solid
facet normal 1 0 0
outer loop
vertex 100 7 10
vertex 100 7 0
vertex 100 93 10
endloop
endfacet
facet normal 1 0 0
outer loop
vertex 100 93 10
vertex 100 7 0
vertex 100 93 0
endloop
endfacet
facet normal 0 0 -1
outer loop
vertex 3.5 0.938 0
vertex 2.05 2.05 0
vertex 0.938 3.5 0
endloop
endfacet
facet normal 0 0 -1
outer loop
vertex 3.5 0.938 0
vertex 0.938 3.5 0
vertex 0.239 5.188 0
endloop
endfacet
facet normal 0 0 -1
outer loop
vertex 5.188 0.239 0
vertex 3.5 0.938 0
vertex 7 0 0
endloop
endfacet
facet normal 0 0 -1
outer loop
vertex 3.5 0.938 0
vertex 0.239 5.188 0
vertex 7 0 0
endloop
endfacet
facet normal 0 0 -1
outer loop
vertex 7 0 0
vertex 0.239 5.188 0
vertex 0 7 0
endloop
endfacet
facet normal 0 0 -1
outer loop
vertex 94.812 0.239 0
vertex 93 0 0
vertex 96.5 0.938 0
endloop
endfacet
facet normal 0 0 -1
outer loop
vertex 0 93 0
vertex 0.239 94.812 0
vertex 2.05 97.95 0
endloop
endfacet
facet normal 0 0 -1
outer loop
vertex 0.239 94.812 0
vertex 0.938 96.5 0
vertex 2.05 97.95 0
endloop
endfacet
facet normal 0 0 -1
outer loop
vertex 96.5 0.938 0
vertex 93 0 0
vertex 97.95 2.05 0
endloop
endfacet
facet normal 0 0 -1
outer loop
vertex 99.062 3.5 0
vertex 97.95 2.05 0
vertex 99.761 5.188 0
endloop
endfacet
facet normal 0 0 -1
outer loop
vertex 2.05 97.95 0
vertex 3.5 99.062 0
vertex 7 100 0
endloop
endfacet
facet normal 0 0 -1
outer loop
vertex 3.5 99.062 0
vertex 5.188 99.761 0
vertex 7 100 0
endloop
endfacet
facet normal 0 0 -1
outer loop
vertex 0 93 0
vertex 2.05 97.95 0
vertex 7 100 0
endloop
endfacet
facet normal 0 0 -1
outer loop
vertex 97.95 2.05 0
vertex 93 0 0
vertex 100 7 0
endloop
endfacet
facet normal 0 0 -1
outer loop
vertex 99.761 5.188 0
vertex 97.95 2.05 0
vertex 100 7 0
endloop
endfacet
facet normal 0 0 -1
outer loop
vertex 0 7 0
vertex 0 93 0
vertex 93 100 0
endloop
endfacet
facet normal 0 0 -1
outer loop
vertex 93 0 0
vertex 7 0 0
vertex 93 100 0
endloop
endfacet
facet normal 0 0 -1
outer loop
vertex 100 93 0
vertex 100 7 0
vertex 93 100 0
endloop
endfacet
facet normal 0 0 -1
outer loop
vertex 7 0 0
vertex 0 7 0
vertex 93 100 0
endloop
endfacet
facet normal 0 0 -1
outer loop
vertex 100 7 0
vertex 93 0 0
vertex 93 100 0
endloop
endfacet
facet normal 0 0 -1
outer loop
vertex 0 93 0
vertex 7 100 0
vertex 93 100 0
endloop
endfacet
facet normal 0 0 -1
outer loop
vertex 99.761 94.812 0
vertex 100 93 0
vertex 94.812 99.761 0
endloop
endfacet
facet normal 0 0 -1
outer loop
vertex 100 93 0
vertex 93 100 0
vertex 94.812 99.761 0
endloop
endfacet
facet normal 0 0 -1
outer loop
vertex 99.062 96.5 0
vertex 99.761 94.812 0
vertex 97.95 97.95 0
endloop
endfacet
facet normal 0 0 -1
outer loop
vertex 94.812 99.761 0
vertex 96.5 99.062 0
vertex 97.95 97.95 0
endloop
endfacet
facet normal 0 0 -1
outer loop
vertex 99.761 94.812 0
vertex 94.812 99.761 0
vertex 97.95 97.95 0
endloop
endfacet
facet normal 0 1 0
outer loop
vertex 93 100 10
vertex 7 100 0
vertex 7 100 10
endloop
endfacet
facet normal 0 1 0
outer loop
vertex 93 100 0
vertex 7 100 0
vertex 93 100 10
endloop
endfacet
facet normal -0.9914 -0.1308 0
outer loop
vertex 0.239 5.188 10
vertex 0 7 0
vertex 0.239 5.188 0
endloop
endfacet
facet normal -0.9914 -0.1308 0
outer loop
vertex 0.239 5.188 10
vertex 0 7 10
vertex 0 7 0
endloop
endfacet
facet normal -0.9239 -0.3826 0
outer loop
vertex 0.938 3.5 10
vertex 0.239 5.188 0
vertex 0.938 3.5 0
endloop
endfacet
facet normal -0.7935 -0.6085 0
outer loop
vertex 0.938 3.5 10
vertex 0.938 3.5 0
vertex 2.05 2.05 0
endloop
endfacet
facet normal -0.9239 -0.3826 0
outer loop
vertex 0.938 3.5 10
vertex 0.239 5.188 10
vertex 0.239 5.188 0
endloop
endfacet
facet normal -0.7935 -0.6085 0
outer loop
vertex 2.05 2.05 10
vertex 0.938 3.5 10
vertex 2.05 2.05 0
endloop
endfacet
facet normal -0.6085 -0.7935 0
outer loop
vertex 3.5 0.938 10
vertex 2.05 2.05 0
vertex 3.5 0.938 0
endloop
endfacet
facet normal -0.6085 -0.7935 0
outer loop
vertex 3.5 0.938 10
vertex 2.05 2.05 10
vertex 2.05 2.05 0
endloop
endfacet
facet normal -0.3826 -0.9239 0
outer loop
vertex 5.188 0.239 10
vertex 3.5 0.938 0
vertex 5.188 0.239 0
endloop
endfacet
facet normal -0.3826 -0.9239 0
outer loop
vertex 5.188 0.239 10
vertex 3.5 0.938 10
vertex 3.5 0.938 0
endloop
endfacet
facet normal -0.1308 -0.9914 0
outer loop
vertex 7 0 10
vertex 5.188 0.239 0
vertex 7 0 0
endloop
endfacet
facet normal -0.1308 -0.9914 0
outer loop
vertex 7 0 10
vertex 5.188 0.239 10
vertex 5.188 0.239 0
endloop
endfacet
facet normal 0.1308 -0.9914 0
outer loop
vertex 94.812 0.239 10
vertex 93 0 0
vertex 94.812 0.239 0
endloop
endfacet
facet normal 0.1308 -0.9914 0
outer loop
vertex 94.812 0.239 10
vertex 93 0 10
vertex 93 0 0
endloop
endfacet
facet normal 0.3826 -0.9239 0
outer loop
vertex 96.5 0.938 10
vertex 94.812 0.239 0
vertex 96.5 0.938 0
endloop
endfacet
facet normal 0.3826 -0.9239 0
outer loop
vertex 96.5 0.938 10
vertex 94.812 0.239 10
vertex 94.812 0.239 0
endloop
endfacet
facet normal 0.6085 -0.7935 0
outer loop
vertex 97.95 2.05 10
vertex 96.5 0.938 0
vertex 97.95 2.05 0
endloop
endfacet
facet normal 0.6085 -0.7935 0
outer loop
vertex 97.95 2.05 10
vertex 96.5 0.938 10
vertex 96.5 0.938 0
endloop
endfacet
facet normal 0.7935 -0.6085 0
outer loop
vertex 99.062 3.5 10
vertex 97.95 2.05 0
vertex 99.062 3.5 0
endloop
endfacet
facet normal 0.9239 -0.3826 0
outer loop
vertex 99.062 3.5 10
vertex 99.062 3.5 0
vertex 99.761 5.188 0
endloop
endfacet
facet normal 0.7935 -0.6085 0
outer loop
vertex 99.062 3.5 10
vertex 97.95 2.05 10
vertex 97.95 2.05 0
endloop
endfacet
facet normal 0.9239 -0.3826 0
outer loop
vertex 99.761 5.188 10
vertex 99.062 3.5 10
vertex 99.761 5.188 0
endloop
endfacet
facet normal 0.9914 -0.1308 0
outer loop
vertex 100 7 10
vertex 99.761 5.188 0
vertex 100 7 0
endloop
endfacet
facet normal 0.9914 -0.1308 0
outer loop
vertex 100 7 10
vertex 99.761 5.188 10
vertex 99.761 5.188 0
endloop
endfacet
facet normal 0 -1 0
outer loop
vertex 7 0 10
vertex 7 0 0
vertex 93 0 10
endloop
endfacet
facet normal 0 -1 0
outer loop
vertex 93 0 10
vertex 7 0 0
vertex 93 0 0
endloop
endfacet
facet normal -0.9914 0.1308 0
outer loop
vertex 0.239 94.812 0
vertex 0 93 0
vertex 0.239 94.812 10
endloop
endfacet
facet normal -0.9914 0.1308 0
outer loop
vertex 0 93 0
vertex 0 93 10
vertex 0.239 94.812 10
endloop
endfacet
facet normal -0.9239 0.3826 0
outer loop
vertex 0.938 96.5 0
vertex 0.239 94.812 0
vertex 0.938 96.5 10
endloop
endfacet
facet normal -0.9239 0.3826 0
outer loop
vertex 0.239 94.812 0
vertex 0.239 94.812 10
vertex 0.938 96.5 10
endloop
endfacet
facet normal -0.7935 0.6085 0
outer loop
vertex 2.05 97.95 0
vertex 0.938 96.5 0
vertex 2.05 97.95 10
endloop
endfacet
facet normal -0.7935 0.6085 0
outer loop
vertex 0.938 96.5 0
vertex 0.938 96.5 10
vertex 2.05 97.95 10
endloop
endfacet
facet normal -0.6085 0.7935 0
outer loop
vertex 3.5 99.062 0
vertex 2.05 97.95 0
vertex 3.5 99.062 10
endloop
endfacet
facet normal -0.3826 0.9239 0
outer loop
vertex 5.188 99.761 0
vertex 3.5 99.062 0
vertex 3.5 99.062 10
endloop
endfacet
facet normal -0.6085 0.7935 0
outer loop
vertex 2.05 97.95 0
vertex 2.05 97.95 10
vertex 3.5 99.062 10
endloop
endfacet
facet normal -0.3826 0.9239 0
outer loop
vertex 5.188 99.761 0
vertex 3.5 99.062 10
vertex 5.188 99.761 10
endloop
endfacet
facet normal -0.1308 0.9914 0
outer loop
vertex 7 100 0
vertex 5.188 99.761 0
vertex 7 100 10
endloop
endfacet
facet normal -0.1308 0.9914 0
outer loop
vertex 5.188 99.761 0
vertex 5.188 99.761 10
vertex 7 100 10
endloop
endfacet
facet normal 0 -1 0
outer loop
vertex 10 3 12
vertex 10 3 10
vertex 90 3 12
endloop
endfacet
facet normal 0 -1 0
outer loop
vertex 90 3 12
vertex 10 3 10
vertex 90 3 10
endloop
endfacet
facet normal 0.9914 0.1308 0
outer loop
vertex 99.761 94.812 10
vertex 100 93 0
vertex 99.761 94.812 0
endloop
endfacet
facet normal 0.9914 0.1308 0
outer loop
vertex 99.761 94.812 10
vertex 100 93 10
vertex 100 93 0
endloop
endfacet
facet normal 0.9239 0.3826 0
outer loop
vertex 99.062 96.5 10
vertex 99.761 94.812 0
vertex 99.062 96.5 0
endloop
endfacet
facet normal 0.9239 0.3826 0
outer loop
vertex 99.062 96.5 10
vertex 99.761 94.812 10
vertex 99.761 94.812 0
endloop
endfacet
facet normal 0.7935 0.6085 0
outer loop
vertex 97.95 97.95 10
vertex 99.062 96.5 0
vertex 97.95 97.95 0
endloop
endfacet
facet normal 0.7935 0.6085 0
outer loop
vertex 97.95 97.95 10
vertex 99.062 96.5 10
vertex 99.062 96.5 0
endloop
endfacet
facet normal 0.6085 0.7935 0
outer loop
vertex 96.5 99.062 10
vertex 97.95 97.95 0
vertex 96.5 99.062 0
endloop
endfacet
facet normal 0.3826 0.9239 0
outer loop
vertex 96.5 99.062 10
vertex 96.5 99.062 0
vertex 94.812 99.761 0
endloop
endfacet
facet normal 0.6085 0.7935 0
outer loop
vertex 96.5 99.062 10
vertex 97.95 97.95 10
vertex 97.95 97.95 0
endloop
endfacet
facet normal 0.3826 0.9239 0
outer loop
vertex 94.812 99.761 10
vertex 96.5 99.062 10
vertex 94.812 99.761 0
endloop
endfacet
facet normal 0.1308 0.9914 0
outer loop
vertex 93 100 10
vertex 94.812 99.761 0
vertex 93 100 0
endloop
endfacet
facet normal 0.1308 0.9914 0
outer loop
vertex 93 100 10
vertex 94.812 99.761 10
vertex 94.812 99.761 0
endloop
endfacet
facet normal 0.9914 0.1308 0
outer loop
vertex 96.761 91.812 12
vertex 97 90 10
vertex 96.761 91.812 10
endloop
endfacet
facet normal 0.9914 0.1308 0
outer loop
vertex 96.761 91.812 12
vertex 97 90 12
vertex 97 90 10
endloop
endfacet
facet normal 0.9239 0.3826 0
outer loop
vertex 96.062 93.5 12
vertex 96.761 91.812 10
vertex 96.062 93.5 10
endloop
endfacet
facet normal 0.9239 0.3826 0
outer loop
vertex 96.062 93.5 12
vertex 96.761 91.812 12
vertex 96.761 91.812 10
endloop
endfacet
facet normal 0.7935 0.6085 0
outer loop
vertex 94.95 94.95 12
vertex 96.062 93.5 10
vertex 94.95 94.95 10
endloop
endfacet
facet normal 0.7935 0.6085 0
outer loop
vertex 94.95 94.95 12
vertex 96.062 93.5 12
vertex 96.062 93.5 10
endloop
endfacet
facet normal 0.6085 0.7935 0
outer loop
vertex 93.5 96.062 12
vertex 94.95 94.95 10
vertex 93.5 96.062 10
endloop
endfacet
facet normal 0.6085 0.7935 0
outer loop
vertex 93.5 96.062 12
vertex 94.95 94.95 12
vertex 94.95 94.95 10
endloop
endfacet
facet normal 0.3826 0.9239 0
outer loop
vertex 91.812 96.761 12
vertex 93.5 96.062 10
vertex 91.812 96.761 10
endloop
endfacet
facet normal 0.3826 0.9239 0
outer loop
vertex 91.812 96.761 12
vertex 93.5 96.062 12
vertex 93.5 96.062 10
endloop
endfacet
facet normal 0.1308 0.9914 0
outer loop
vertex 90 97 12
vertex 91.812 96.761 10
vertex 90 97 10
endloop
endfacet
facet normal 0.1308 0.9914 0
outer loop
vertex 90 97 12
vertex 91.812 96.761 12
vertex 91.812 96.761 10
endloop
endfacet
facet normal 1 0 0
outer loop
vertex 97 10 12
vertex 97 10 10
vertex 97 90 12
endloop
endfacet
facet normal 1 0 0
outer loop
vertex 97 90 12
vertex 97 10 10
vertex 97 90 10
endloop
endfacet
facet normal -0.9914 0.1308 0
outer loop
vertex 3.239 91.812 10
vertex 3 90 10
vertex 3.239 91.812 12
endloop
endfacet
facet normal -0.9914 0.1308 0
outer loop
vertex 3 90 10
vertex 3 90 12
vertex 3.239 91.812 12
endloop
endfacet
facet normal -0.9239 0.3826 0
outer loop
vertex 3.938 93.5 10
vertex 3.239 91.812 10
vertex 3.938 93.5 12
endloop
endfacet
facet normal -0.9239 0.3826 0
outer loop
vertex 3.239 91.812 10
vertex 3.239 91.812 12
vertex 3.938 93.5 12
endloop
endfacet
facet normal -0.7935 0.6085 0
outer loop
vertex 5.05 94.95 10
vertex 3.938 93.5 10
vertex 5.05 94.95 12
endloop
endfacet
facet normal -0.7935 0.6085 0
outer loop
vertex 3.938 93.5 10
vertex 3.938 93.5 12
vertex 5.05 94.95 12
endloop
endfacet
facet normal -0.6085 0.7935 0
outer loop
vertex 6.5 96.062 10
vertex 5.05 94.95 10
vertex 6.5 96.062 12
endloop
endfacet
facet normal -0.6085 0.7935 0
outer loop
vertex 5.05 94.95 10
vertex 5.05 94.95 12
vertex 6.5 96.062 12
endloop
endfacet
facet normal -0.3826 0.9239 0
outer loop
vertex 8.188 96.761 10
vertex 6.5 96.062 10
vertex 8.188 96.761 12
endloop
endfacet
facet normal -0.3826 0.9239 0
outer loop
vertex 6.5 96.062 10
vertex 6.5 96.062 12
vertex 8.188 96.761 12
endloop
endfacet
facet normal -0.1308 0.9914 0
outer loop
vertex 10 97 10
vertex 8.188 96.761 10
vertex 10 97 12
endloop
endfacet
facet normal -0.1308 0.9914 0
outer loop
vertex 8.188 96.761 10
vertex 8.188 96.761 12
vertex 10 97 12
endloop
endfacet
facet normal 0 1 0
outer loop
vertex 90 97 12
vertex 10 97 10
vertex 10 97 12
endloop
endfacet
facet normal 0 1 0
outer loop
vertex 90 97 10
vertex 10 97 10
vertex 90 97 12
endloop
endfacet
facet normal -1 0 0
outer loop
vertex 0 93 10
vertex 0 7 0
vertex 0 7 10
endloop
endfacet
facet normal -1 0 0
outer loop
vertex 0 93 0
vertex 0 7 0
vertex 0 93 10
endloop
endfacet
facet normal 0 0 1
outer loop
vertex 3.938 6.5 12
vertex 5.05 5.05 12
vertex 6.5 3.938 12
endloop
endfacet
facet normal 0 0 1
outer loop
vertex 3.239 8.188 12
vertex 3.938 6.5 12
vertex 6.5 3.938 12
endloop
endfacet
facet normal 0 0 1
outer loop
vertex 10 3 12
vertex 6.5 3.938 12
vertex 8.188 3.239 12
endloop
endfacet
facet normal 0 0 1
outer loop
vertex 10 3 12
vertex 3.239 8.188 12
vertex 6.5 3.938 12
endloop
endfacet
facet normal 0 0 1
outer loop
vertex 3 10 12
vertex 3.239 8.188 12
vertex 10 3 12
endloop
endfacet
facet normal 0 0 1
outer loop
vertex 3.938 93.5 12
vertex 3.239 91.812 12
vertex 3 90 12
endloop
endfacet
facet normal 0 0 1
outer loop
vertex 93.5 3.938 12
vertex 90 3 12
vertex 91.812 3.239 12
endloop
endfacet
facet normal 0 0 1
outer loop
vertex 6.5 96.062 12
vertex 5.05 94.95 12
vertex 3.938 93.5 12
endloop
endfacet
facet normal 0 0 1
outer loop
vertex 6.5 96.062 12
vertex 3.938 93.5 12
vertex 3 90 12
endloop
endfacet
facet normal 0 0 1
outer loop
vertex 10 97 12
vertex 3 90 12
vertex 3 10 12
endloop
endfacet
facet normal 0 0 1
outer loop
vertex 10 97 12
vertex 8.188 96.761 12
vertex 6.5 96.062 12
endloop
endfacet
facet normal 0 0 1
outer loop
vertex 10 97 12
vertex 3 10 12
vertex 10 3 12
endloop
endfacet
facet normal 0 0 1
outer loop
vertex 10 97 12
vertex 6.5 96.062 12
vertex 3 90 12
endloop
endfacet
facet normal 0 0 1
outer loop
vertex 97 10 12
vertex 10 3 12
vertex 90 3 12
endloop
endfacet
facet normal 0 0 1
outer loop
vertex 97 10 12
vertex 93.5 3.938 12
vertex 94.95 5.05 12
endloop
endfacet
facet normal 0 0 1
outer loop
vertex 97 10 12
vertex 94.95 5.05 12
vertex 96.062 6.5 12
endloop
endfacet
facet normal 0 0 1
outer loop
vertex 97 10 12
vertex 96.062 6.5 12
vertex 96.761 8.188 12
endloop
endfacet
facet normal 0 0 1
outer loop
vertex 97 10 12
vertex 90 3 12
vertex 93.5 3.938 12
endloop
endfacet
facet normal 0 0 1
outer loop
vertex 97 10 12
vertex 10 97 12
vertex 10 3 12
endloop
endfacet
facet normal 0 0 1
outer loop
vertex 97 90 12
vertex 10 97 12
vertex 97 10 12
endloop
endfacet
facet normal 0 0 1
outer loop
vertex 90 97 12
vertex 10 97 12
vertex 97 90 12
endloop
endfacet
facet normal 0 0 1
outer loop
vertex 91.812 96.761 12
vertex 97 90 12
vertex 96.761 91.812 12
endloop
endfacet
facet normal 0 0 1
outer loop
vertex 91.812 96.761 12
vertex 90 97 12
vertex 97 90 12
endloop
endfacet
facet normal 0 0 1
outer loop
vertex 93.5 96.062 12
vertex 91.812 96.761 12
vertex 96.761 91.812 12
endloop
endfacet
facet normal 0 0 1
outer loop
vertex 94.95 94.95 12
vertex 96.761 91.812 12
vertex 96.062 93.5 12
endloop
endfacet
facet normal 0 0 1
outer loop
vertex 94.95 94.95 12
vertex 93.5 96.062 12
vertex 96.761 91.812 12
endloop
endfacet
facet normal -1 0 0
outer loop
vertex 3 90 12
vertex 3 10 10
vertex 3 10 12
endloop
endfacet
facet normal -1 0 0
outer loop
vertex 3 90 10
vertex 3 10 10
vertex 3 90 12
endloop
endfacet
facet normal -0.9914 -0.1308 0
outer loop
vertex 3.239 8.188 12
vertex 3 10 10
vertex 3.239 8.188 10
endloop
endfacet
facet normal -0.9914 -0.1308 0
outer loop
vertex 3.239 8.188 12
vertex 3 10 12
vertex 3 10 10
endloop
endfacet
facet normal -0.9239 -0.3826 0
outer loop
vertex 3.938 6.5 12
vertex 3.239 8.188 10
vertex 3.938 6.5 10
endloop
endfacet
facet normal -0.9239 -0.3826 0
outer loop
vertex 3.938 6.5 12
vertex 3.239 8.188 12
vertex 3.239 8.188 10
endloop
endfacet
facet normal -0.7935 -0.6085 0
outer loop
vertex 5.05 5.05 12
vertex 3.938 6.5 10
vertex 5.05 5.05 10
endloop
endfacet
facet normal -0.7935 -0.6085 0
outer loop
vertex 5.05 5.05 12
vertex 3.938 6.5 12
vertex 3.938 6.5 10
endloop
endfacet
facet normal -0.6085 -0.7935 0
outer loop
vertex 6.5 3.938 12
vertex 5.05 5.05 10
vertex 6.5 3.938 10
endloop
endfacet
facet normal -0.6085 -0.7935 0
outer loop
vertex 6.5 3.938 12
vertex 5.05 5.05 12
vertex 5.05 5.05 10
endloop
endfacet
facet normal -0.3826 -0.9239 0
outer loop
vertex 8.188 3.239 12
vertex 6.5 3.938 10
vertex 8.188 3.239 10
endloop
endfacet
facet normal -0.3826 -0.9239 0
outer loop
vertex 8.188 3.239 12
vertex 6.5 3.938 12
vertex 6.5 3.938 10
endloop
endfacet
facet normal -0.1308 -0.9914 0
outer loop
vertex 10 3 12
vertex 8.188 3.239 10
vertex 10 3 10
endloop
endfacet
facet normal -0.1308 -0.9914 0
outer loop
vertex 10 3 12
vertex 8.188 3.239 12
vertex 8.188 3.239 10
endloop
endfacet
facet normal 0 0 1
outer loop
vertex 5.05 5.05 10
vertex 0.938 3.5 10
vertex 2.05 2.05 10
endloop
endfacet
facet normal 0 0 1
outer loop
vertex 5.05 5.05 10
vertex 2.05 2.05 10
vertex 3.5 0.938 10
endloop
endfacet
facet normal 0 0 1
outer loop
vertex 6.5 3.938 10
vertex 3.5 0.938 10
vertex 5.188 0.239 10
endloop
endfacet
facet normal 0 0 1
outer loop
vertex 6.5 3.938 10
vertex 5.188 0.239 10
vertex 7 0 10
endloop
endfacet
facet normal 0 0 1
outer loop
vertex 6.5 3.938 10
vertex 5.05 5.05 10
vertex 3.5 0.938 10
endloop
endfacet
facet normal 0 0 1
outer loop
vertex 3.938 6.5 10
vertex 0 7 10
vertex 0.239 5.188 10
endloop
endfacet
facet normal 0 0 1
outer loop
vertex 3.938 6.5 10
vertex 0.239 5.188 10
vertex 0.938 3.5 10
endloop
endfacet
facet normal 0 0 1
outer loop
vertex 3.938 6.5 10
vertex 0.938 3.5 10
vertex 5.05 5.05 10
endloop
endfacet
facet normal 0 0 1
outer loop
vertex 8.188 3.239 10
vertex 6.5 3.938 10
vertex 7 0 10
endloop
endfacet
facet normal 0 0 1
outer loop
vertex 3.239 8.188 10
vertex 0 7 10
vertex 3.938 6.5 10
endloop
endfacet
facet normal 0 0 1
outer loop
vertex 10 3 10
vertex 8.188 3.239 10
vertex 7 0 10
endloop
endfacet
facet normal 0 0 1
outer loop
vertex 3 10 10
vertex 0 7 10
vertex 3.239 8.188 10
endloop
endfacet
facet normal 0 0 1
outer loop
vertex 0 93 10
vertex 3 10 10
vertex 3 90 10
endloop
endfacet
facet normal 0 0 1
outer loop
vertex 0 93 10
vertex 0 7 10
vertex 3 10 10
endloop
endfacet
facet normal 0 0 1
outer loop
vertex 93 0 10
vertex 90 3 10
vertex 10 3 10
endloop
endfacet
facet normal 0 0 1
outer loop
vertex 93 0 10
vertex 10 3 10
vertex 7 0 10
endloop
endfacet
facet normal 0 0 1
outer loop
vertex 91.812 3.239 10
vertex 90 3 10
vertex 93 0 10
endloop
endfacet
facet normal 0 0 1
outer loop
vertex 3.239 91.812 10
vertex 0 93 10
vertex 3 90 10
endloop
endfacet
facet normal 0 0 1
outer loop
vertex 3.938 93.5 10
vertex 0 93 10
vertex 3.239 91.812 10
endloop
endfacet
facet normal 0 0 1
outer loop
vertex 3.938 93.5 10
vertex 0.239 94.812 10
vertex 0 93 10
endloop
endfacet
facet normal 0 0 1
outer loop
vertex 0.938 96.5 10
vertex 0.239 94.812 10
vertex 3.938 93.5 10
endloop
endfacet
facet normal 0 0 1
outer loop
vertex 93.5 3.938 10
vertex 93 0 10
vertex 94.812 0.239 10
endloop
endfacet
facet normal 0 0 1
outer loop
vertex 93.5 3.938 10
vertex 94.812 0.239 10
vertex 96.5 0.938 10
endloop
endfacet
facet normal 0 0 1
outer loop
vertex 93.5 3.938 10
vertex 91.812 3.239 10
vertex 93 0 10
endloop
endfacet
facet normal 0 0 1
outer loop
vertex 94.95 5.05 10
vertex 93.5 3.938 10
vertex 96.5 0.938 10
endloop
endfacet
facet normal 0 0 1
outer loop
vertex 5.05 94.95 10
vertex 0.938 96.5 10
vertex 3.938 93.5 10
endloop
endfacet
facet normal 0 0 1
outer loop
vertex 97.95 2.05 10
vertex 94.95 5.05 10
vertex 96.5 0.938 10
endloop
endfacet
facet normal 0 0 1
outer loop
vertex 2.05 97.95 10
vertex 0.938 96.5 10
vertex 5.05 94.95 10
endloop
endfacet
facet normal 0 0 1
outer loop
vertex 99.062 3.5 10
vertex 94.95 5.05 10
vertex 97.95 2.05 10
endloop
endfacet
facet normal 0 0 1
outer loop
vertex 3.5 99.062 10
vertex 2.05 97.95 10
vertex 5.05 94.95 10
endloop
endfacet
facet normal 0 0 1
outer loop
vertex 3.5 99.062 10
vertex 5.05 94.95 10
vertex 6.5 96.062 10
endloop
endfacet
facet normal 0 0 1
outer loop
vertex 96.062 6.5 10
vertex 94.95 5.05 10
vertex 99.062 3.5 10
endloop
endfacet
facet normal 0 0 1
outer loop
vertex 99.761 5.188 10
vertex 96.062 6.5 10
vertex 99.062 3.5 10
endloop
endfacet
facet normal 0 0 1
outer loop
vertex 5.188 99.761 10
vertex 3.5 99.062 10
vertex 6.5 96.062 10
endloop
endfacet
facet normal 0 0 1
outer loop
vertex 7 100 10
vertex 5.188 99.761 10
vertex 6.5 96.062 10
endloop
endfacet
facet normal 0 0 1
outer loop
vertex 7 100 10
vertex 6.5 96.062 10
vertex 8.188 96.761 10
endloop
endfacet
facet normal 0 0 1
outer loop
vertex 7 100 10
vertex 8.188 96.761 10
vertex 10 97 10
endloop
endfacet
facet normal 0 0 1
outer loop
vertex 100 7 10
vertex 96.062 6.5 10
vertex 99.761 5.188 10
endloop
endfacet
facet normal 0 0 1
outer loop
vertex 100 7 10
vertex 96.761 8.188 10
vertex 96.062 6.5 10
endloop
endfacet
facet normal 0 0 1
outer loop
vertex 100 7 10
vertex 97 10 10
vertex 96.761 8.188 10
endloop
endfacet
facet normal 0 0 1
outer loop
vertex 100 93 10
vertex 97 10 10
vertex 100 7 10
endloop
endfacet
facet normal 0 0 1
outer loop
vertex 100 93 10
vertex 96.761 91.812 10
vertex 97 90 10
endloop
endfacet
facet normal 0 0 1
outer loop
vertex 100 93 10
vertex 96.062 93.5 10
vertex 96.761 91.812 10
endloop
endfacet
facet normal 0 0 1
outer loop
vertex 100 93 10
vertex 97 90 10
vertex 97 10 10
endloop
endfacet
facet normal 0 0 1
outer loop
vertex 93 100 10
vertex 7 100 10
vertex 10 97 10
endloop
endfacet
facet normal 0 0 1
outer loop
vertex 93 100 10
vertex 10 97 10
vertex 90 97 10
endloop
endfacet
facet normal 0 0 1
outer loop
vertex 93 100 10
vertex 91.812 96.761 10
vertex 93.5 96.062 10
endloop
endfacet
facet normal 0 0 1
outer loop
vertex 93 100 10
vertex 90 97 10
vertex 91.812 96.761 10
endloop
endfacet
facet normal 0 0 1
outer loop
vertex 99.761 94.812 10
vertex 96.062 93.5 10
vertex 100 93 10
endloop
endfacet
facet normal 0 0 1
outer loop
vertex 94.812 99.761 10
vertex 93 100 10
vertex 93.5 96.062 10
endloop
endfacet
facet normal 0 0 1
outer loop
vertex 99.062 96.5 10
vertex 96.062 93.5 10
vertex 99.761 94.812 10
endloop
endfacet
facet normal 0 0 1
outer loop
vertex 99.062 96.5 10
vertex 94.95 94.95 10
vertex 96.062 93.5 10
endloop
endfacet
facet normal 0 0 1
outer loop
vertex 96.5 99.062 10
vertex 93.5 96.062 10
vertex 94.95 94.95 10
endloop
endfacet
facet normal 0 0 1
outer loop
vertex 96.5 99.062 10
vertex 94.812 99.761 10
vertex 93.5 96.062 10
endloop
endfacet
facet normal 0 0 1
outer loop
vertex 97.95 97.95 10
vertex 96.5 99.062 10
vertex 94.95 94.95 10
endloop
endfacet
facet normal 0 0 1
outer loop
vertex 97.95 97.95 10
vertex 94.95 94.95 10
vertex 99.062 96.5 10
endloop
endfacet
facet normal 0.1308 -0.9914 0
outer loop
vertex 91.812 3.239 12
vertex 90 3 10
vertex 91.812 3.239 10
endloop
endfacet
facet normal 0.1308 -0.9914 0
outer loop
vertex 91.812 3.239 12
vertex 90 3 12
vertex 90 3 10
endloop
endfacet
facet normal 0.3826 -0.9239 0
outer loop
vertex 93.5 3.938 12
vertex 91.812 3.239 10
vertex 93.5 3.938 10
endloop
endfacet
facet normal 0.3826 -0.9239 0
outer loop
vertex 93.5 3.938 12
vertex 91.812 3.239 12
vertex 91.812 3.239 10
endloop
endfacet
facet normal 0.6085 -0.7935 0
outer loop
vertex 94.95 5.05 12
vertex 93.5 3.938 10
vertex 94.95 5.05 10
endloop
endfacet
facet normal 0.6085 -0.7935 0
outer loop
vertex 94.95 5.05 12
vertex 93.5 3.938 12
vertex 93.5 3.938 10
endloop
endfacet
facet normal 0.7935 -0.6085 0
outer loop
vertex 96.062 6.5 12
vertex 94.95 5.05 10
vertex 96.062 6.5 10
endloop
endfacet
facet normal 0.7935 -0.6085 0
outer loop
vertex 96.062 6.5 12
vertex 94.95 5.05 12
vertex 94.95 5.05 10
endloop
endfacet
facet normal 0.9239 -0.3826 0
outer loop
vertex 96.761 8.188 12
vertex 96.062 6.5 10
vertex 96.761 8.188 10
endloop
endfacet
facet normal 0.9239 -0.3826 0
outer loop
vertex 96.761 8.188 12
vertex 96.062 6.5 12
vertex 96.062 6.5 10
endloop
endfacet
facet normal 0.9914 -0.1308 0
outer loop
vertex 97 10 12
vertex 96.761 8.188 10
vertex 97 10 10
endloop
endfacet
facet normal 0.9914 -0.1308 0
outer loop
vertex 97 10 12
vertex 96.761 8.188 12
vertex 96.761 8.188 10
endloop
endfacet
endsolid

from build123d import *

# Parameters (mm, degrees)
BOX002_W     = 100
BOX002_H     = 100
BOX002_DEPTH = 10
FILLET002_R  = 7
BOX003_W     = 94
BOX003_H     = 94
BOX003_DEPTH = 2
FILLET003_R  = 7


with BuildPart() as body_with_fillets001:
    # Box002 → Box002 (new body)
    with BuildSketch(Plane.XY):
        with Locations((50, 50)):
            Rectangle(BOX002_W, BOX002_H)
    extrude(amount=BOX002_DEPTH)

    # Fillet002
    fillet002_edges = [body_with_fillets001.edges().sort_by_distance(p)[0] for p in [
        (0, 0, 5),
        (0, 100, 5),
        (100, 0, 5),
        (100, 100, 5),
    ]]
    fillet(fillet002_edges, radius=FILLET002_R)


with BuildPart() as base003:
    # Box003 → Box003 (new body)
    with BuildSketch(Plane(origin=(3, 3, 10), x_dir=(1, 0, 0), z_dir=(0, 0, 1))):
        with Locations((47, 47)):
            Rectangle(BOX003_W, BOX003_H)
    extrude(amount=BOX003_DEPTH)

    # Fillet003
    fillet003_edges = [base003.edges().sort_by_distance(p)[0] for p in [
        (3, 3, 11),
        (3, 97, 11),
        (97, 3, 11),
        (97, 97, 11),
    ]]
    fillet(fillet003_edges, radius=FILLET003_R)

    # Fusion001: union Body with fillets001
    add(body_with_fillets001.part)


solid = base003.part
